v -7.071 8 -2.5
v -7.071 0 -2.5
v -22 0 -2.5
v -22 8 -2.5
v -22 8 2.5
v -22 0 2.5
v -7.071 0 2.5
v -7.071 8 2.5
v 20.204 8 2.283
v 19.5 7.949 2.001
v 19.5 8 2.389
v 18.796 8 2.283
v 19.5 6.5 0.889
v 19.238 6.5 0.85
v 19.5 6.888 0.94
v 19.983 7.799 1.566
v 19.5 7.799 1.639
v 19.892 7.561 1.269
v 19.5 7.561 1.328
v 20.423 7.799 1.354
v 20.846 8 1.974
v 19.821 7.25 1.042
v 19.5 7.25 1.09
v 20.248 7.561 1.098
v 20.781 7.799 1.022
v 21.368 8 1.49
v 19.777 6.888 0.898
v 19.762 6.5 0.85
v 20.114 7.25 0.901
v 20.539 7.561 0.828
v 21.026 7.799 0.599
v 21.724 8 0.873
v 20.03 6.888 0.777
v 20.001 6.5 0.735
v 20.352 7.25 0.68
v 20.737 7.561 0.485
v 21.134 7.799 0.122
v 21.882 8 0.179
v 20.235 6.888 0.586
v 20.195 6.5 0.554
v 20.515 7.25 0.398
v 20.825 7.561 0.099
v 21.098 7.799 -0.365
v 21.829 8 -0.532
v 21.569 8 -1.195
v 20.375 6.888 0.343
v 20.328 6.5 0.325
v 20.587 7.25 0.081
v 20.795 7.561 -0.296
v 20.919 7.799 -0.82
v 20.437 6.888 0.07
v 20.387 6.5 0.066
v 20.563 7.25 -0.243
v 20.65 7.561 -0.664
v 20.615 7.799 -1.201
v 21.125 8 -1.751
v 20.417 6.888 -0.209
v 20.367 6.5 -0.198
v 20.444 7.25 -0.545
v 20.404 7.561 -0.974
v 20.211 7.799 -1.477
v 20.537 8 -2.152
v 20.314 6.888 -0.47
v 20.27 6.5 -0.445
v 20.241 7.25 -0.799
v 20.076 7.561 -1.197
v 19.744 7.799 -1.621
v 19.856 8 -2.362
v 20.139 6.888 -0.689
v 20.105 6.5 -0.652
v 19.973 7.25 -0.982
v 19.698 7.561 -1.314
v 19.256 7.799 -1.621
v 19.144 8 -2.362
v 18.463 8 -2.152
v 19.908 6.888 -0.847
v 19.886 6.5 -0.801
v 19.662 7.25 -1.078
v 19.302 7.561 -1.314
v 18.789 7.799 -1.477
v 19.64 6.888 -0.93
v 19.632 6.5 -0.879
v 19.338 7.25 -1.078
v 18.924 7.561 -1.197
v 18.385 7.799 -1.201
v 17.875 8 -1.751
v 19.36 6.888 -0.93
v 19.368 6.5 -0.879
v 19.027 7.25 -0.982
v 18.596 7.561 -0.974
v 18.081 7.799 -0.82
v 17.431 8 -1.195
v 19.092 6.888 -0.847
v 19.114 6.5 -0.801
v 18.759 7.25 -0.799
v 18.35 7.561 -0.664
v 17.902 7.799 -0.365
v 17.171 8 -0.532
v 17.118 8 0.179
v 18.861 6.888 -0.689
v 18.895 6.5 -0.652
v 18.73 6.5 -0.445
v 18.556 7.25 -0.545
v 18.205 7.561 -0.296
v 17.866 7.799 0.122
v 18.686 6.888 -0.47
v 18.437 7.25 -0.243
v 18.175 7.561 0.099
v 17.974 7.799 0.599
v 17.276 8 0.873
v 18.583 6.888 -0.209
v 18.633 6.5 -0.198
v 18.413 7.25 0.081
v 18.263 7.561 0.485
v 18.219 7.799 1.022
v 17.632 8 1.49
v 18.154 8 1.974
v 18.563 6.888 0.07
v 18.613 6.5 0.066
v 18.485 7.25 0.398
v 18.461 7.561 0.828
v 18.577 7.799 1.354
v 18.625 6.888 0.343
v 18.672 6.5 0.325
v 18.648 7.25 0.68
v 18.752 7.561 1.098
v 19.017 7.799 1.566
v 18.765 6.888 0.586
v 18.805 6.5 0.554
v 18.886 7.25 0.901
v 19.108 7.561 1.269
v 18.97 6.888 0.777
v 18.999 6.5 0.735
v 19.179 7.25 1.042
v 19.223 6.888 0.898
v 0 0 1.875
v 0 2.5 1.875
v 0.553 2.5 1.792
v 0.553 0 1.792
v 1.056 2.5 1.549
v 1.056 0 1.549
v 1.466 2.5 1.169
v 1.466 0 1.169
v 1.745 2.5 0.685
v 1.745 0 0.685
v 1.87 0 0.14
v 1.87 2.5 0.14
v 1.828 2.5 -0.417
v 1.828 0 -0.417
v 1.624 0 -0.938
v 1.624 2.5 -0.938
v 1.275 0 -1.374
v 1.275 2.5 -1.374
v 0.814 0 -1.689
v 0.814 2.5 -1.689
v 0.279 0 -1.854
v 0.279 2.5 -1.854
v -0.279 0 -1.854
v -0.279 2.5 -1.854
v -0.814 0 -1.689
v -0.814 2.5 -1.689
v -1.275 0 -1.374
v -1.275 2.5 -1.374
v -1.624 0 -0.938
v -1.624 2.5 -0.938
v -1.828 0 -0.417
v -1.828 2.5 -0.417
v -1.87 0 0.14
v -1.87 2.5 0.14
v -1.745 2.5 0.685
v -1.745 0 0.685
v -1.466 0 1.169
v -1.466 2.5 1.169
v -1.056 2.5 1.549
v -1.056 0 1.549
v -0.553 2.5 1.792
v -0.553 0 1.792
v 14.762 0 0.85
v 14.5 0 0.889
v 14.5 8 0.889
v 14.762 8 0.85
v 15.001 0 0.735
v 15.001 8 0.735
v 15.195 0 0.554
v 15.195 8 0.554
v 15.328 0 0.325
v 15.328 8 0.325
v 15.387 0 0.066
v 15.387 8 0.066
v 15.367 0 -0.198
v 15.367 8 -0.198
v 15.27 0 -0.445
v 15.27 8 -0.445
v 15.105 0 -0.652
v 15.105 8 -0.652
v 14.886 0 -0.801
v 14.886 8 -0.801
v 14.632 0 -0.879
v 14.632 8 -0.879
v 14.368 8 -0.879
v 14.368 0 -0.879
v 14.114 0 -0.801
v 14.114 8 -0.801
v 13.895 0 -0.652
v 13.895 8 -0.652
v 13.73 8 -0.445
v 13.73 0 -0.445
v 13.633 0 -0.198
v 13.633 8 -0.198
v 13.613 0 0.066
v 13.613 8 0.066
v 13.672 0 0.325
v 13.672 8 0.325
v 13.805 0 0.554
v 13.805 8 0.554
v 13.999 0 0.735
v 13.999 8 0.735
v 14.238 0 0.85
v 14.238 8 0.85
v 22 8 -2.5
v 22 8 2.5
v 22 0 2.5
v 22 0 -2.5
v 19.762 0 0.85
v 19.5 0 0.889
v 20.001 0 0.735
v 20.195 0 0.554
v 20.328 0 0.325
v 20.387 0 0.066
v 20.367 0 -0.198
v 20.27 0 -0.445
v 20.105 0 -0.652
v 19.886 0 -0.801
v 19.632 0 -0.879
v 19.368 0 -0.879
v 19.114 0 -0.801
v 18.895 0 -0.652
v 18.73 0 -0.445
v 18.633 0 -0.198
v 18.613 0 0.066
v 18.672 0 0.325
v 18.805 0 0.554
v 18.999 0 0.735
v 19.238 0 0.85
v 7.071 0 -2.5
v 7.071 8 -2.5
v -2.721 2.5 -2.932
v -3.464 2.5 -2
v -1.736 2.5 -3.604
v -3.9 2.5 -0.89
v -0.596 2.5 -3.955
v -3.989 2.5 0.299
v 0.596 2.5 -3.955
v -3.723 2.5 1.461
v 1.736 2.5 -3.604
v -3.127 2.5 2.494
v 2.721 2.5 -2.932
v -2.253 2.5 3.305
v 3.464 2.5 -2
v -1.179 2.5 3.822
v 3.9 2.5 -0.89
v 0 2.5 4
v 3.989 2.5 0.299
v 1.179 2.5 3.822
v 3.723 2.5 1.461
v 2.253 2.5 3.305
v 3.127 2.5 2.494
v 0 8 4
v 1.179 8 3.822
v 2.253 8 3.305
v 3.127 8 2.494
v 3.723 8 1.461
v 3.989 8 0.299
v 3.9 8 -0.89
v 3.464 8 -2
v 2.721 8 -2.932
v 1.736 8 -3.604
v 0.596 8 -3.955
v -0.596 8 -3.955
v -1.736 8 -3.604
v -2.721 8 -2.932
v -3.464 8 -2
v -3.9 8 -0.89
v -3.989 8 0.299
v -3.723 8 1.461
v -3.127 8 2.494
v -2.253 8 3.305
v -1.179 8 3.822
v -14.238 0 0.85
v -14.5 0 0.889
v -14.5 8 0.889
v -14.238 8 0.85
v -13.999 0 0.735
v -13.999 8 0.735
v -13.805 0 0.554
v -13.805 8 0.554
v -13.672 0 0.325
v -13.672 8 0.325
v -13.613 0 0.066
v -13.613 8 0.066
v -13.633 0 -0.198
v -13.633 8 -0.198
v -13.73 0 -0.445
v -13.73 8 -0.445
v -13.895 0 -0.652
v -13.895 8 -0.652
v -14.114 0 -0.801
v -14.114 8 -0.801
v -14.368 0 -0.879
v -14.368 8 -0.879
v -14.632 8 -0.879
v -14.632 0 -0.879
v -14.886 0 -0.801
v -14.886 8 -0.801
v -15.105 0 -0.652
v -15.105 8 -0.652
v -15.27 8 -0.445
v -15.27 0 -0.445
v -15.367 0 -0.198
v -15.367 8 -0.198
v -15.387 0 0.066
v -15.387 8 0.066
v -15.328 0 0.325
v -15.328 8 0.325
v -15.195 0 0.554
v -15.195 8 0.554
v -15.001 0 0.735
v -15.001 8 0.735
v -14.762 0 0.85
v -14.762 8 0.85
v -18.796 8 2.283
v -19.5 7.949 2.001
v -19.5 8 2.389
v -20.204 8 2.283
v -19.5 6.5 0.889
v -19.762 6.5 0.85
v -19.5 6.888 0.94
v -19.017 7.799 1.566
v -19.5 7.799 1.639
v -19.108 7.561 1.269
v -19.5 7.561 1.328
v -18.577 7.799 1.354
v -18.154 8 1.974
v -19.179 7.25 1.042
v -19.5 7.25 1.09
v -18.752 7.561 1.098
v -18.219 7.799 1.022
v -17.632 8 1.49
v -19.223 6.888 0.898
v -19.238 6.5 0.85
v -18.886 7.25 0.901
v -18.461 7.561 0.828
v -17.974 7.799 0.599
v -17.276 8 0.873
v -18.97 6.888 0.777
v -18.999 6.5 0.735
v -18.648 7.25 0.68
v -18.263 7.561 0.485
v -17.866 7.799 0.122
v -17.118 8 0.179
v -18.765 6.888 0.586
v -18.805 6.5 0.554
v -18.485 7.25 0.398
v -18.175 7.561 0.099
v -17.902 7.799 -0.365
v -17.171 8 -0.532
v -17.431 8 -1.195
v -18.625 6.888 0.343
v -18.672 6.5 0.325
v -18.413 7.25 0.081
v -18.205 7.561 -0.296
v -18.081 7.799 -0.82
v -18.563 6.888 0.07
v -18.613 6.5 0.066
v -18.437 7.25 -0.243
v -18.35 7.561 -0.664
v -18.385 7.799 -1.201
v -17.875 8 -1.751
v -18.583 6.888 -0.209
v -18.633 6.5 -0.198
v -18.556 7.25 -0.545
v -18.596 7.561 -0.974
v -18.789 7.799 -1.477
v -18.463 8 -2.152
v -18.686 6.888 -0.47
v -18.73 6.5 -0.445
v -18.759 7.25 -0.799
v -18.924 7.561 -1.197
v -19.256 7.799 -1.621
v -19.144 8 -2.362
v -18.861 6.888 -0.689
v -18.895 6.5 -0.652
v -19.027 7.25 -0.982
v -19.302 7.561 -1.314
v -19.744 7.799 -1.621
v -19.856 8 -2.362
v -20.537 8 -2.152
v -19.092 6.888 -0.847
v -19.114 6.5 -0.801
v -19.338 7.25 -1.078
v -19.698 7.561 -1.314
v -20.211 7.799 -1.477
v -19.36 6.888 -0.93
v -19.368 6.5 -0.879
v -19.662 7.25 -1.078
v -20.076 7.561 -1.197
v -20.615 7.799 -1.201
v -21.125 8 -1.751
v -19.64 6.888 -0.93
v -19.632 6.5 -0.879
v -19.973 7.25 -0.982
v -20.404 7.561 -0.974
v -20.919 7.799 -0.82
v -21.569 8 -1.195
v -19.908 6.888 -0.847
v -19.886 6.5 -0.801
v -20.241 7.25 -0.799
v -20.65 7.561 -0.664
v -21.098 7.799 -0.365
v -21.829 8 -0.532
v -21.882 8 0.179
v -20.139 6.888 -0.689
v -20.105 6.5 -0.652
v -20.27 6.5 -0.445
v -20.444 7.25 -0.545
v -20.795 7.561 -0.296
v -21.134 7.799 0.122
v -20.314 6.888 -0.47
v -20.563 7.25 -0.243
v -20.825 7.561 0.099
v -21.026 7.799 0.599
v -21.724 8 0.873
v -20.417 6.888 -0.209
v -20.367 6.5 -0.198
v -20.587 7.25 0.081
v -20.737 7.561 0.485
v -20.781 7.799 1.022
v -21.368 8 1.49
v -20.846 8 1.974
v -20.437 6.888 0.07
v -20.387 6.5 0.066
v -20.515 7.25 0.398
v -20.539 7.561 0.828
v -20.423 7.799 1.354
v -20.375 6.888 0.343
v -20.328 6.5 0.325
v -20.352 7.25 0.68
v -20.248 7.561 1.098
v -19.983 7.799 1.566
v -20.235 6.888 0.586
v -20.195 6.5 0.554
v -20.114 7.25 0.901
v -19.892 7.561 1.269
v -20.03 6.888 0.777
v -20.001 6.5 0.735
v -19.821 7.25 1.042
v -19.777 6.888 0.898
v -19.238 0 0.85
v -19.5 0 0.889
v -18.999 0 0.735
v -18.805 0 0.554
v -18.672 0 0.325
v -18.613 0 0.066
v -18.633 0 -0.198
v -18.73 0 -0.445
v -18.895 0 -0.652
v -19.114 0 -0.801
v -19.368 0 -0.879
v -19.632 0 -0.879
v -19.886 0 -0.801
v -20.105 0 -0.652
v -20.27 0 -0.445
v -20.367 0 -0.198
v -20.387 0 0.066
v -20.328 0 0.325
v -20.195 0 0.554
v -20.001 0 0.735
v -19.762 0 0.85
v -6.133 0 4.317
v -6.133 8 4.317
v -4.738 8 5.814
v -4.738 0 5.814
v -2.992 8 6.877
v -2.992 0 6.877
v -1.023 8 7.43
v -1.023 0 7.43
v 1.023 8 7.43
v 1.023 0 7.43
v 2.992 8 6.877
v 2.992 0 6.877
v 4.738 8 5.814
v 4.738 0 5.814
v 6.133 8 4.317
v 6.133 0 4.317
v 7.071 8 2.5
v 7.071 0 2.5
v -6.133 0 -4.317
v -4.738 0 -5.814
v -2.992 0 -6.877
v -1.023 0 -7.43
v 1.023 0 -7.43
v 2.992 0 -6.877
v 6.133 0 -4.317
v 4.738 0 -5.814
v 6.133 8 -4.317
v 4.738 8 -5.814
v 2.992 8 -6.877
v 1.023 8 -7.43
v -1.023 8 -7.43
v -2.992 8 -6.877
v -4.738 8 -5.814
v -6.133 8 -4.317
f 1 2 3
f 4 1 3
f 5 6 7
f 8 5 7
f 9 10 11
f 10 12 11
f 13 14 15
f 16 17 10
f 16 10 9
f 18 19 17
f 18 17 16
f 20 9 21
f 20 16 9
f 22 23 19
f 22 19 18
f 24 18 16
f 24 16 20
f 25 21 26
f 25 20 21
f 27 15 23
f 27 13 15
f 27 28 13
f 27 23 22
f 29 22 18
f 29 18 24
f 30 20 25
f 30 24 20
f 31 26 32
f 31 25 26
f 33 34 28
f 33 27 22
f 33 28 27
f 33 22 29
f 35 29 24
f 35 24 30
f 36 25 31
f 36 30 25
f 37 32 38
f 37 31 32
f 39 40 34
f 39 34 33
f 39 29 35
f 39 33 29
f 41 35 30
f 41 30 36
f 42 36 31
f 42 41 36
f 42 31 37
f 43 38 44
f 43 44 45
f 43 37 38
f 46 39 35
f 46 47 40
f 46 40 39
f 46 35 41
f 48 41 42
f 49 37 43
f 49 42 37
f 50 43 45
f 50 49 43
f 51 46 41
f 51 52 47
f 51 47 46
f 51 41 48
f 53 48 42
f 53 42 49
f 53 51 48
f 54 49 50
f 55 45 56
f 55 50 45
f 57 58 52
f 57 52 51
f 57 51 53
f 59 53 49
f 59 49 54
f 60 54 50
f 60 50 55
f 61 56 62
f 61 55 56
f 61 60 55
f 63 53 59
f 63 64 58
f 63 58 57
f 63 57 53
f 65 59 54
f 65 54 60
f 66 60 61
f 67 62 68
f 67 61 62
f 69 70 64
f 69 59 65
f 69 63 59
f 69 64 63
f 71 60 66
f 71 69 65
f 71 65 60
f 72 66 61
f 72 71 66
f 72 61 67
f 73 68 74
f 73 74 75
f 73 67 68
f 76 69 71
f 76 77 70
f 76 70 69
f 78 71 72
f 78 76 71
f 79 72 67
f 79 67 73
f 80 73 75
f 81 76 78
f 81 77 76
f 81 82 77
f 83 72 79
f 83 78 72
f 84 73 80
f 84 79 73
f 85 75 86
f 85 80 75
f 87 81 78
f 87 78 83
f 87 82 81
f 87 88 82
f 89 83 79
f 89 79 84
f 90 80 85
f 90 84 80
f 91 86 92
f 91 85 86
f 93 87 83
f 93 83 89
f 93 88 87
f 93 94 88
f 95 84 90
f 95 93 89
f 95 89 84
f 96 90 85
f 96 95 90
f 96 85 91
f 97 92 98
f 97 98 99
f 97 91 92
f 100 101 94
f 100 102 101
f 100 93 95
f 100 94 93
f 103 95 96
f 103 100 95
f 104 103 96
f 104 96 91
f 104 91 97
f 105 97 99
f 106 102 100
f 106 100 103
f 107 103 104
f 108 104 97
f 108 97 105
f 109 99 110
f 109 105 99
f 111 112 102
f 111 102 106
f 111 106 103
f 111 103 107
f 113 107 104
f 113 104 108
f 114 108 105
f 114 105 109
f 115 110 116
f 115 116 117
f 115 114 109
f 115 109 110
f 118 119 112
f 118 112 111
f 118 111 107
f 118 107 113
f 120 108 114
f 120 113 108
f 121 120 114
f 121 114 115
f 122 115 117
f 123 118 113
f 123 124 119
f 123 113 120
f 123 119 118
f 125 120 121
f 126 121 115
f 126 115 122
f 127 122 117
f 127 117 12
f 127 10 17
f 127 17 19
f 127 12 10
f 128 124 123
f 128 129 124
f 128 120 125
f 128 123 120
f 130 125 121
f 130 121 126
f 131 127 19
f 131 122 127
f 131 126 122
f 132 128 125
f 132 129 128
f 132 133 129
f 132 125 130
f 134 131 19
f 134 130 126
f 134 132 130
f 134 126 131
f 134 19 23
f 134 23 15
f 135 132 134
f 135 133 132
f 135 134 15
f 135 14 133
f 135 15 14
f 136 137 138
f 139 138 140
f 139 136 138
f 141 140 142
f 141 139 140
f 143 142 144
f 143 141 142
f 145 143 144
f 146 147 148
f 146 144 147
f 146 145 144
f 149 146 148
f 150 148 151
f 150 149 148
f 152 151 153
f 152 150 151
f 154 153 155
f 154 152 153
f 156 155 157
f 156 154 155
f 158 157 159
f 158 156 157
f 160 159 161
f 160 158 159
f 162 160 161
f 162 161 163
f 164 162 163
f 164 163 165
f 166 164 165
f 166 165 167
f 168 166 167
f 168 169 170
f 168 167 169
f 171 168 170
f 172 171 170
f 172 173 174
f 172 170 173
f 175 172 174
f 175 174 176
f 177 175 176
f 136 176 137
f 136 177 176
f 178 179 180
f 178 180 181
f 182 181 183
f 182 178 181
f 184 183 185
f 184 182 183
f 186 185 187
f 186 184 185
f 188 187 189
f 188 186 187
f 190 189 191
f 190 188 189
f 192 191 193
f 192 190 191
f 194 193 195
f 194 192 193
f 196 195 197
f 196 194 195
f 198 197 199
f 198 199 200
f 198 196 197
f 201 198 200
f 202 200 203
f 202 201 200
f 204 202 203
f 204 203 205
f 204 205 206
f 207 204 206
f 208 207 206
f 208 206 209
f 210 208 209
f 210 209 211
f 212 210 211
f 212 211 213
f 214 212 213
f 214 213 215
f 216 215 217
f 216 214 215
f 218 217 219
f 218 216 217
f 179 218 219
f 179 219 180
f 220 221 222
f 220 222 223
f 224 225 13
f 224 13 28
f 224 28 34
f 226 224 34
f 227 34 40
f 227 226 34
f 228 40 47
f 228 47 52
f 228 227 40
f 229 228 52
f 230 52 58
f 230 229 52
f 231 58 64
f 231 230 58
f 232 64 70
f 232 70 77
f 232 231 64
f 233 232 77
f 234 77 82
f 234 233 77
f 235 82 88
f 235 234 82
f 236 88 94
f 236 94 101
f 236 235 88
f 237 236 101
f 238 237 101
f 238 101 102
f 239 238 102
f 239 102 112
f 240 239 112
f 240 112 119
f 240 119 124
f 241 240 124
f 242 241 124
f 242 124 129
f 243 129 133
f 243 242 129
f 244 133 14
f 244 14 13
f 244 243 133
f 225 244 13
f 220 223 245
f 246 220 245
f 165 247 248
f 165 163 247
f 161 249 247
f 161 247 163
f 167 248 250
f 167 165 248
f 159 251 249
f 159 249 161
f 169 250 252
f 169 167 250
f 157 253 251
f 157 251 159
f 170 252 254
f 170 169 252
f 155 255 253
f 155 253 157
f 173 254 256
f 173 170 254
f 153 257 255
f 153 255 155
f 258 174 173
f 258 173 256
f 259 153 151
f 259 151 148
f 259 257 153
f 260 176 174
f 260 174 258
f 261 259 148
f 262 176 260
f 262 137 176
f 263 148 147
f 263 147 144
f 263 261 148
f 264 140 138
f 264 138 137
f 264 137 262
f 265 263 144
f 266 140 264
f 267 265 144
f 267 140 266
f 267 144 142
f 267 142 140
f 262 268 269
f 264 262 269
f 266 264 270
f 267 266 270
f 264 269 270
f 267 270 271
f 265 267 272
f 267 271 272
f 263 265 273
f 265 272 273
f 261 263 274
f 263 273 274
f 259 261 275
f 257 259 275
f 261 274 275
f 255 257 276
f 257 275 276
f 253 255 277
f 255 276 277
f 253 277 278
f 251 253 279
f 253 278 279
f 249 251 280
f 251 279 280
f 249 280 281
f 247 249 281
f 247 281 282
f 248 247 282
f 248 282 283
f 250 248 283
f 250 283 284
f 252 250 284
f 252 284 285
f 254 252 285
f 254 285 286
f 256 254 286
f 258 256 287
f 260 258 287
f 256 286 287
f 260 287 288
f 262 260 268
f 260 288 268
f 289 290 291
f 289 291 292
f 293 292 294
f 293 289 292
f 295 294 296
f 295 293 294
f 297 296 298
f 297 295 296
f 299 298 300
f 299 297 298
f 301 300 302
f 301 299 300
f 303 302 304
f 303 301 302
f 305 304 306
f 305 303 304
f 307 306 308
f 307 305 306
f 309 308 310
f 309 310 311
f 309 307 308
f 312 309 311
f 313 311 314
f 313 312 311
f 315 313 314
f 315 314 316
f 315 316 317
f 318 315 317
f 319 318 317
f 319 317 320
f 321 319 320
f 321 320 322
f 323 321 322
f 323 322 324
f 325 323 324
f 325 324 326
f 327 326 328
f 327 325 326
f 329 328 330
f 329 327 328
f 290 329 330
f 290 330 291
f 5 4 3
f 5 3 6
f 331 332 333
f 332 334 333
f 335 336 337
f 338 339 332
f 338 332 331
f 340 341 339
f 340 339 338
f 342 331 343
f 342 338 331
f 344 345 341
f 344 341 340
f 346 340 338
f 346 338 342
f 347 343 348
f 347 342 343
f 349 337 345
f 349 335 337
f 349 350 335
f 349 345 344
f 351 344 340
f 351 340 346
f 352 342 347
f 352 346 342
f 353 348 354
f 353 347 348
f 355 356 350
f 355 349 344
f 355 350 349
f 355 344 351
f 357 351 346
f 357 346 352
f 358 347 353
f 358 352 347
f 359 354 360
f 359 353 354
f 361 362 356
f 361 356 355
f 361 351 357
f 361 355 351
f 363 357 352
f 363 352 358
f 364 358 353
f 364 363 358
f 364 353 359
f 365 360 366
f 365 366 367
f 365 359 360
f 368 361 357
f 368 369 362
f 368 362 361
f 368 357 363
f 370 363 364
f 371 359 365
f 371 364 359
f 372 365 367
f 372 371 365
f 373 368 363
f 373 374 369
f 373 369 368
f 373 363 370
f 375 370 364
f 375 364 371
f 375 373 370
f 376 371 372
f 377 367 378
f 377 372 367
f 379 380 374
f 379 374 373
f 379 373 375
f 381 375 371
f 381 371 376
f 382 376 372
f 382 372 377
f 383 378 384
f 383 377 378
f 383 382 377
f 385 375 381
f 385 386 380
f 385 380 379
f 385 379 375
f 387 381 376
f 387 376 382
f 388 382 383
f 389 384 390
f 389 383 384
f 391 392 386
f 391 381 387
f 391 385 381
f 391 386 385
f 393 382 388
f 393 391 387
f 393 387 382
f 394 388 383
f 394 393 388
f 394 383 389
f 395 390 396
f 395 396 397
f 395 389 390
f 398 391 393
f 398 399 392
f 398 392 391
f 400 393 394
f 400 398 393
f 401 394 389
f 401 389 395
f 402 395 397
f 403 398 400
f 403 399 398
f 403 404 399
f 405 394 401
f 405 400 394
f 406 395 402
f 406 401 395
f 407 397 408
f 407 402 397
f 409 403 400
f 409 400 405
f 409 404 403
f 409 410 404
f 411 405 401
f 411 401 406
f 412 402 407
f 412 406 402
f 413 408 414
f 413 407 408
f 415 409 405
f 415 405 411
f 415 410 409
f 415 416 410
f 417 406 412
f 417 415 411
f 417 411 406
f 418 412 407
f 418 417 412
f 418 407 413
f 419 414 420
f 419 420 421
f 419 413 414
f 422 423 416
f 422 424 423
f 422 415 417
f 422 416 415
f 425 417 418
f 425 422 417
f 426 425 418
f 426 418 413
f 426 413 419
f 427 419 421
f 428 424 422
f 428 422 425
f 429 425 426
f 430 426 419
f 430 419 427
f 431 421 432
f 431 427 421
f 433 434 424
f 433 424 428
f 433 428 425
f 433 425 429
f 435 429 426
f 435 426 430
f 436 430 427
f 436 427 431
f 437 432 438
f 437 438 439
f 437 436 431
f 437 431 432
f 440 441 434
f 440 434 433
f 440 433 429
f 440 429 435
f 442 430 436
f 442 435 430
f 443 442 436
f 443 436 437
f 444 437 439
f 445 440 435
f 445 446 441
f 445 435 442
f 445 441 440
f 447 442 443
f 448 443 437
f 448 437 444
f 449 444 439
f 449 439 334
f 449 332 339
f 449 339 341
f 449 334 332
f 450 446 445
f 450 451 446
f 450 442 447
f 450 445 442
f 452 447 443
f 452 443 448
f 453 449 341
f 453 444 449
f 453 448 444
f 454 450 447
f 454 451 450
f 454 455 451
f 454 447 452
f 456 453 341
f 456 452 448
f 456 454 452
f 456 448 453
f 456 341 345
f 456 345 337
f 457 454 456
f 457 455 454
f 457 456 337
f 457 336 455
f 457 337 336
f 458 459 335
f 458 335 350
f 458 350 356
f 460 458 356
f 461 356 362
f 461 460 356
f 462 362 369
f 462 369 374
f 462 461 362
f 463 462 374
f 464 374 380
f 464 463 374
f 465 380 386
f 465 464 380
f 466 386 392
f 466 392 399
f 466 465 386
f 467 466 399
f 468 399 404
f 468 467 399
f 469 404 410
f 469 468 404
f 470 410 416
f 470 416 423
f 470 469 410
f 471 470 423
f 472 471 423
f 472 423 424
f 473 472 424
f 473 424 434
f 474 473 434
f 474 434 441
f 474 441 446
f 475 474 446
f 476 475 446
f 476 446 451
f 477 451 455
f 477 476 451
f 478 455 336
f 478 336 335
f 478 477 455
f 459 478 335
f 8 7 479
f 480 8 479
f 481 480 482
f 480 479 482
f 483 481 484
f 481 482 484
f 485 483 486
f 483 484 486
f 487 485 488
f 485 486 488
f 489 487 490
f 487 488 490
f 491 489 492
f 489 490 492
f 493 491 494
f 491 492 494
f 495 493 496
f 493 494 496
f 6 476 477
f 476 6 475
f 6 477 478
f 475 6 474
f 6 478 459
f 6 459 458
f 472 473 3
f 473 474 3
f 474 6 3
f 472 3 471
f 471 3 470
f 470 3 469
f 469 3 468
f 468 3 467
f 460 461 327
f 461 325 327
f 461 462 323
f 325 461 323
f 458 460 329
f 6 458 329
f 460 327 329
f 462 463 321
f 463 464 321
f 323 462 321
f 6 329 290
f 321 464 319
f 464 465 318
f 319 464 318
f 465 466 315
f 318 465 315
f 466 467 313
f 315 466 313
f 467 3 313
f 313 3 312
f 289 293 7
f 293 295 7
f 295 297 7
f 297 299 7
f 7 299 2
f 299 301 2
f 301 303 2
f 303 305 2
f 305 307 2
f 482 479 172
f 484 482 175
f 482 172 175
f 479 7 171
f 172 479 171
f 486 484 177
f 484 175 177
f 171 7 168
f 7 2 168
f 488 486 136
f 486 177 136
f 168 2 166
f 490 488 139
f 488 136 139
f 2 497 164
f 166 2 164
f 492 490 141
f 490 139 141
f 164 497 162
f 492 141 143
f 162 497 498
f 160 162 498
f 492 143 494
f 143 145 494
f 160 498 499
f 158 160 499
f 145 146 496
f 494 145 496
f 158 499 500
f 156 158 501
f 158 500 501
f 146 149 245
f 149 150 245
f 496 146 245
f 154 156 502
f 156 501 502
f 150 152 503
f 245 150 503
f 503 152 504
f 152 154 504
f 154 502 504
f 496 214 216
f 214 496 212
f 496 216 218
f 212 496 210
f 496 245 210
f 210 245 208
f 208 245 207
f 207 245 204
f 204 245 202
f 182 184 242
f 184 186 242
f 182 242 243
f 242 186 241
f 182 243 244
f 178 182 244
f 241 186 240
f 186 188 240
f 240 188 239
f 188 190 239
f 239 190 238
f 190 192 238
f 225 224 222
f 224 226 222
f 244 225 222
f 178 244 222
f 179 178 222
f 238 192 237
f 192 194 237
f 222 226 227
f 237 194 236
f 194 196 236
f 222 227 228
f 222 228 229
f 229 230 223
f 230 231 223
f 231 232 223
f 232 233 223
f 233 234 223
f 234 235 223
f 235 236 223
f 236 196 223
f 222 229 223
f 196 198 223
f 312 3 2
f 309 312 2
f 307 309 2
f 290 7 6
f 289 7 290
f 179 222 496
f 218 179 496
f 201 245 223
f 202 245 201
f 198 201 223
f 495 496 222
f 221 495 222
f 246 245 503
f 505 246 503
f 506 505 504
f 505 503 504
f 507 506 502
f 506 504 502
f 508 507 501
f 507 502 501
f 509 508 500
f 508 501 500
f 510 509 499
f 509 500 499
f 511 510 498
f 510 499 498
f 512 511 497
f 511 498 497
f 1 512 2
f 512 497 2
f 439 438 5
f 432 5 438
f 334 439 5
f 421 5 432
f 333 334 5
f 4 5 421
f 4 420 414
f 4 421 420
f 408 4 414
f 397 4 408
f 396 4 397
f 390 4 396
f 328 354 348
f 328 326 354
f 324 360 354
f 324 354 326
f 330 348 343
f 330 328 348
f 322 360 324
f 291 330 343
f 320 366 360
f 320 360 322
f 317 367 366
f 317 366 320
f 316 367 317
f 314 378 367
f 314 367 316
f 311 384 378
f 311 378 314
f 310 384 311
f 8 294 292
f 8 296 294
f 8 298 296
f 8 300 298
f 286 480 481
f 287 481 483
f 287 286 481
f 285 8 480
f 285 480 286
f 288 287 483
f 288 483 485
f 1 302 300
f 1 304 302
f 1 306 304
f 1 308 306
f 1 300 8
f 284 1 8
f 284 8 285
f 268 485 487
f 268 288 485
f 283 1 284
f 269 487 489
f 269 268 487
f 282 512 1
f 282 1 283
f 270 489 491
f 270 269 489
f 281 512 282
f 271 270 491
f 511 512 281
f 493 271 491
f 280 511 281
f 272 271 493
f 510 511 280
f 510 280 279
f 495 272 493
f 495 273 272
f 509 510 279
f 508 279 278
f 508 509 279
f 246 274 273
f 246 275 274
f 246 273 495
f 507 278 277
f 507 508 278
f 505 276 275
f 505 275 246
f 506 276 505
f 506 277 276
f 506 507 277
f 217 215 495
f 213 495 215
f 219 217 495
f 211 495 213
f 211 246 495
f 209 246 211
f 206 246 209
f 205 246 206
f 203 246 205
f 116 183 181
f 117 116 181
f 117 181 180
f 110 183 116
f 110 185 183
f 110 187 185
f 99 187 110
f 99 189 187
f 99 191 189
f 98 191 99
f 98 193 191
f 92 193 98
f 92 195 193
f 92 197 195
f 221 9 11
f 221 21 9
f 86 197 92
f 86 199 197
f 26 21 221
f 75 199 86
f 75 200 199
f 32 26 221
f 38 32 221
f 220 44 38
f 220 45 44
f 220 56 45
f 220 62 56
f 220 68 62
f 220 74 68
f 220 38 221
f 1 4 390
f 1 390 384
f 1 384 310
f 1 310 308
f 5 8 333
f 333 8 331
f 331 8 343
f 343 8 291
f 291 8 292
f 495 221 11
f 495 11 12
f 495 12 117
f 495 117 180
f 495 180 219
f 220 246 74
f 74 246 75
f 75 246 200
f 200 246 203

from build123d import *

# Parameters (mm, degrees)
SKETCH1_R           = 0.889
SKETCH1_R_2         = 1.875
BOSS_EXTRUDE1_DEPTH = 8
SKETCH2_R           = 4
CUT_EXTRUDE1_DEPTH  = 5.5
FILLET1_R           = 1.5


with BuildPart() as part:
    # Sketch1 → Boss-Extrude1 (new body)
    with BuildSketch(Plane(origin=(0, 0, 0), x_dir=(1, 0, 0), z_dir=(0, 1, 0))):
        with BuildLine():
            Line((-7.071067812, 2.5), (-22, 2.5))
            Line((-22, 2.5), (-22, -2.5))
            Line((-22, -2.5), (-7.071067812, -2.5))
            ThreePointArc((-7.071067812, -2.5), (0, -7.5), (7.071067812, -2.5))
            Line((7.071067812, -2.5), (22, -2.5))
            Line((22, -2.5), (22, 2.5))
            Line((22, 2.5), (7.071067812, 2.5))
            ThreePointArc((7.071067812, 2.5), (0, 7.5), (-7.071067812, 2.5))
        make_face()
        with Locations(Location((-19.5, 0, 0), (0, 0, 270))):
            Circle(SKETCH1_R, mode=Mode.SUBTRACT)
        with Locations(Location((0, 0, 0), (0, 0, 270))):
            Circle(SKETCH1_R_2, mode=Mode.SUBTRACT)
        with Locations(Location((19.5, 0, 0), (0, 0, 270))):
            Circle(SKETCH1_R, mode=Mode.SUBTRACT)
        with Locations(Location((-14.5, 0, 0), (0, 0, 270))):
            Circle(SKETCH1_R, mode=Mode.SUBTRACT)
        with Locations(Location((14.5, 0, 0), (0, 0, 270))):
            Circle(SKETCH1_R, mode=Mode.SUBTRACT)
    extrude(amount=BOSS_EXTRUDE1_DEPTH)

    # Sketch2 → Cut-Extrude1 (cut)
    with BuildSketch(Plane(origin=(0, 8, 0), x_dir=(1, 0, 0), z_dir=(0, 1, 0))):
        with Locations(Location((0, 0, 0), (0, 0, 270))):
            Circle(SKETCH2_R)
    extrude(amount=-CUT_EXTRUDE1_DEPTH, mode=Mode.SUBTRACT)

    # Fillet1
    fillet1_edges = [part.edges().sort_by_distance(p)[0] for p in [
        (-19.5, 8, -0.889),
        (19.5, 8, -0.889),
    ]]
    fillet(fillet1_edges, radius=FILLET1_R)


solid = part.part
